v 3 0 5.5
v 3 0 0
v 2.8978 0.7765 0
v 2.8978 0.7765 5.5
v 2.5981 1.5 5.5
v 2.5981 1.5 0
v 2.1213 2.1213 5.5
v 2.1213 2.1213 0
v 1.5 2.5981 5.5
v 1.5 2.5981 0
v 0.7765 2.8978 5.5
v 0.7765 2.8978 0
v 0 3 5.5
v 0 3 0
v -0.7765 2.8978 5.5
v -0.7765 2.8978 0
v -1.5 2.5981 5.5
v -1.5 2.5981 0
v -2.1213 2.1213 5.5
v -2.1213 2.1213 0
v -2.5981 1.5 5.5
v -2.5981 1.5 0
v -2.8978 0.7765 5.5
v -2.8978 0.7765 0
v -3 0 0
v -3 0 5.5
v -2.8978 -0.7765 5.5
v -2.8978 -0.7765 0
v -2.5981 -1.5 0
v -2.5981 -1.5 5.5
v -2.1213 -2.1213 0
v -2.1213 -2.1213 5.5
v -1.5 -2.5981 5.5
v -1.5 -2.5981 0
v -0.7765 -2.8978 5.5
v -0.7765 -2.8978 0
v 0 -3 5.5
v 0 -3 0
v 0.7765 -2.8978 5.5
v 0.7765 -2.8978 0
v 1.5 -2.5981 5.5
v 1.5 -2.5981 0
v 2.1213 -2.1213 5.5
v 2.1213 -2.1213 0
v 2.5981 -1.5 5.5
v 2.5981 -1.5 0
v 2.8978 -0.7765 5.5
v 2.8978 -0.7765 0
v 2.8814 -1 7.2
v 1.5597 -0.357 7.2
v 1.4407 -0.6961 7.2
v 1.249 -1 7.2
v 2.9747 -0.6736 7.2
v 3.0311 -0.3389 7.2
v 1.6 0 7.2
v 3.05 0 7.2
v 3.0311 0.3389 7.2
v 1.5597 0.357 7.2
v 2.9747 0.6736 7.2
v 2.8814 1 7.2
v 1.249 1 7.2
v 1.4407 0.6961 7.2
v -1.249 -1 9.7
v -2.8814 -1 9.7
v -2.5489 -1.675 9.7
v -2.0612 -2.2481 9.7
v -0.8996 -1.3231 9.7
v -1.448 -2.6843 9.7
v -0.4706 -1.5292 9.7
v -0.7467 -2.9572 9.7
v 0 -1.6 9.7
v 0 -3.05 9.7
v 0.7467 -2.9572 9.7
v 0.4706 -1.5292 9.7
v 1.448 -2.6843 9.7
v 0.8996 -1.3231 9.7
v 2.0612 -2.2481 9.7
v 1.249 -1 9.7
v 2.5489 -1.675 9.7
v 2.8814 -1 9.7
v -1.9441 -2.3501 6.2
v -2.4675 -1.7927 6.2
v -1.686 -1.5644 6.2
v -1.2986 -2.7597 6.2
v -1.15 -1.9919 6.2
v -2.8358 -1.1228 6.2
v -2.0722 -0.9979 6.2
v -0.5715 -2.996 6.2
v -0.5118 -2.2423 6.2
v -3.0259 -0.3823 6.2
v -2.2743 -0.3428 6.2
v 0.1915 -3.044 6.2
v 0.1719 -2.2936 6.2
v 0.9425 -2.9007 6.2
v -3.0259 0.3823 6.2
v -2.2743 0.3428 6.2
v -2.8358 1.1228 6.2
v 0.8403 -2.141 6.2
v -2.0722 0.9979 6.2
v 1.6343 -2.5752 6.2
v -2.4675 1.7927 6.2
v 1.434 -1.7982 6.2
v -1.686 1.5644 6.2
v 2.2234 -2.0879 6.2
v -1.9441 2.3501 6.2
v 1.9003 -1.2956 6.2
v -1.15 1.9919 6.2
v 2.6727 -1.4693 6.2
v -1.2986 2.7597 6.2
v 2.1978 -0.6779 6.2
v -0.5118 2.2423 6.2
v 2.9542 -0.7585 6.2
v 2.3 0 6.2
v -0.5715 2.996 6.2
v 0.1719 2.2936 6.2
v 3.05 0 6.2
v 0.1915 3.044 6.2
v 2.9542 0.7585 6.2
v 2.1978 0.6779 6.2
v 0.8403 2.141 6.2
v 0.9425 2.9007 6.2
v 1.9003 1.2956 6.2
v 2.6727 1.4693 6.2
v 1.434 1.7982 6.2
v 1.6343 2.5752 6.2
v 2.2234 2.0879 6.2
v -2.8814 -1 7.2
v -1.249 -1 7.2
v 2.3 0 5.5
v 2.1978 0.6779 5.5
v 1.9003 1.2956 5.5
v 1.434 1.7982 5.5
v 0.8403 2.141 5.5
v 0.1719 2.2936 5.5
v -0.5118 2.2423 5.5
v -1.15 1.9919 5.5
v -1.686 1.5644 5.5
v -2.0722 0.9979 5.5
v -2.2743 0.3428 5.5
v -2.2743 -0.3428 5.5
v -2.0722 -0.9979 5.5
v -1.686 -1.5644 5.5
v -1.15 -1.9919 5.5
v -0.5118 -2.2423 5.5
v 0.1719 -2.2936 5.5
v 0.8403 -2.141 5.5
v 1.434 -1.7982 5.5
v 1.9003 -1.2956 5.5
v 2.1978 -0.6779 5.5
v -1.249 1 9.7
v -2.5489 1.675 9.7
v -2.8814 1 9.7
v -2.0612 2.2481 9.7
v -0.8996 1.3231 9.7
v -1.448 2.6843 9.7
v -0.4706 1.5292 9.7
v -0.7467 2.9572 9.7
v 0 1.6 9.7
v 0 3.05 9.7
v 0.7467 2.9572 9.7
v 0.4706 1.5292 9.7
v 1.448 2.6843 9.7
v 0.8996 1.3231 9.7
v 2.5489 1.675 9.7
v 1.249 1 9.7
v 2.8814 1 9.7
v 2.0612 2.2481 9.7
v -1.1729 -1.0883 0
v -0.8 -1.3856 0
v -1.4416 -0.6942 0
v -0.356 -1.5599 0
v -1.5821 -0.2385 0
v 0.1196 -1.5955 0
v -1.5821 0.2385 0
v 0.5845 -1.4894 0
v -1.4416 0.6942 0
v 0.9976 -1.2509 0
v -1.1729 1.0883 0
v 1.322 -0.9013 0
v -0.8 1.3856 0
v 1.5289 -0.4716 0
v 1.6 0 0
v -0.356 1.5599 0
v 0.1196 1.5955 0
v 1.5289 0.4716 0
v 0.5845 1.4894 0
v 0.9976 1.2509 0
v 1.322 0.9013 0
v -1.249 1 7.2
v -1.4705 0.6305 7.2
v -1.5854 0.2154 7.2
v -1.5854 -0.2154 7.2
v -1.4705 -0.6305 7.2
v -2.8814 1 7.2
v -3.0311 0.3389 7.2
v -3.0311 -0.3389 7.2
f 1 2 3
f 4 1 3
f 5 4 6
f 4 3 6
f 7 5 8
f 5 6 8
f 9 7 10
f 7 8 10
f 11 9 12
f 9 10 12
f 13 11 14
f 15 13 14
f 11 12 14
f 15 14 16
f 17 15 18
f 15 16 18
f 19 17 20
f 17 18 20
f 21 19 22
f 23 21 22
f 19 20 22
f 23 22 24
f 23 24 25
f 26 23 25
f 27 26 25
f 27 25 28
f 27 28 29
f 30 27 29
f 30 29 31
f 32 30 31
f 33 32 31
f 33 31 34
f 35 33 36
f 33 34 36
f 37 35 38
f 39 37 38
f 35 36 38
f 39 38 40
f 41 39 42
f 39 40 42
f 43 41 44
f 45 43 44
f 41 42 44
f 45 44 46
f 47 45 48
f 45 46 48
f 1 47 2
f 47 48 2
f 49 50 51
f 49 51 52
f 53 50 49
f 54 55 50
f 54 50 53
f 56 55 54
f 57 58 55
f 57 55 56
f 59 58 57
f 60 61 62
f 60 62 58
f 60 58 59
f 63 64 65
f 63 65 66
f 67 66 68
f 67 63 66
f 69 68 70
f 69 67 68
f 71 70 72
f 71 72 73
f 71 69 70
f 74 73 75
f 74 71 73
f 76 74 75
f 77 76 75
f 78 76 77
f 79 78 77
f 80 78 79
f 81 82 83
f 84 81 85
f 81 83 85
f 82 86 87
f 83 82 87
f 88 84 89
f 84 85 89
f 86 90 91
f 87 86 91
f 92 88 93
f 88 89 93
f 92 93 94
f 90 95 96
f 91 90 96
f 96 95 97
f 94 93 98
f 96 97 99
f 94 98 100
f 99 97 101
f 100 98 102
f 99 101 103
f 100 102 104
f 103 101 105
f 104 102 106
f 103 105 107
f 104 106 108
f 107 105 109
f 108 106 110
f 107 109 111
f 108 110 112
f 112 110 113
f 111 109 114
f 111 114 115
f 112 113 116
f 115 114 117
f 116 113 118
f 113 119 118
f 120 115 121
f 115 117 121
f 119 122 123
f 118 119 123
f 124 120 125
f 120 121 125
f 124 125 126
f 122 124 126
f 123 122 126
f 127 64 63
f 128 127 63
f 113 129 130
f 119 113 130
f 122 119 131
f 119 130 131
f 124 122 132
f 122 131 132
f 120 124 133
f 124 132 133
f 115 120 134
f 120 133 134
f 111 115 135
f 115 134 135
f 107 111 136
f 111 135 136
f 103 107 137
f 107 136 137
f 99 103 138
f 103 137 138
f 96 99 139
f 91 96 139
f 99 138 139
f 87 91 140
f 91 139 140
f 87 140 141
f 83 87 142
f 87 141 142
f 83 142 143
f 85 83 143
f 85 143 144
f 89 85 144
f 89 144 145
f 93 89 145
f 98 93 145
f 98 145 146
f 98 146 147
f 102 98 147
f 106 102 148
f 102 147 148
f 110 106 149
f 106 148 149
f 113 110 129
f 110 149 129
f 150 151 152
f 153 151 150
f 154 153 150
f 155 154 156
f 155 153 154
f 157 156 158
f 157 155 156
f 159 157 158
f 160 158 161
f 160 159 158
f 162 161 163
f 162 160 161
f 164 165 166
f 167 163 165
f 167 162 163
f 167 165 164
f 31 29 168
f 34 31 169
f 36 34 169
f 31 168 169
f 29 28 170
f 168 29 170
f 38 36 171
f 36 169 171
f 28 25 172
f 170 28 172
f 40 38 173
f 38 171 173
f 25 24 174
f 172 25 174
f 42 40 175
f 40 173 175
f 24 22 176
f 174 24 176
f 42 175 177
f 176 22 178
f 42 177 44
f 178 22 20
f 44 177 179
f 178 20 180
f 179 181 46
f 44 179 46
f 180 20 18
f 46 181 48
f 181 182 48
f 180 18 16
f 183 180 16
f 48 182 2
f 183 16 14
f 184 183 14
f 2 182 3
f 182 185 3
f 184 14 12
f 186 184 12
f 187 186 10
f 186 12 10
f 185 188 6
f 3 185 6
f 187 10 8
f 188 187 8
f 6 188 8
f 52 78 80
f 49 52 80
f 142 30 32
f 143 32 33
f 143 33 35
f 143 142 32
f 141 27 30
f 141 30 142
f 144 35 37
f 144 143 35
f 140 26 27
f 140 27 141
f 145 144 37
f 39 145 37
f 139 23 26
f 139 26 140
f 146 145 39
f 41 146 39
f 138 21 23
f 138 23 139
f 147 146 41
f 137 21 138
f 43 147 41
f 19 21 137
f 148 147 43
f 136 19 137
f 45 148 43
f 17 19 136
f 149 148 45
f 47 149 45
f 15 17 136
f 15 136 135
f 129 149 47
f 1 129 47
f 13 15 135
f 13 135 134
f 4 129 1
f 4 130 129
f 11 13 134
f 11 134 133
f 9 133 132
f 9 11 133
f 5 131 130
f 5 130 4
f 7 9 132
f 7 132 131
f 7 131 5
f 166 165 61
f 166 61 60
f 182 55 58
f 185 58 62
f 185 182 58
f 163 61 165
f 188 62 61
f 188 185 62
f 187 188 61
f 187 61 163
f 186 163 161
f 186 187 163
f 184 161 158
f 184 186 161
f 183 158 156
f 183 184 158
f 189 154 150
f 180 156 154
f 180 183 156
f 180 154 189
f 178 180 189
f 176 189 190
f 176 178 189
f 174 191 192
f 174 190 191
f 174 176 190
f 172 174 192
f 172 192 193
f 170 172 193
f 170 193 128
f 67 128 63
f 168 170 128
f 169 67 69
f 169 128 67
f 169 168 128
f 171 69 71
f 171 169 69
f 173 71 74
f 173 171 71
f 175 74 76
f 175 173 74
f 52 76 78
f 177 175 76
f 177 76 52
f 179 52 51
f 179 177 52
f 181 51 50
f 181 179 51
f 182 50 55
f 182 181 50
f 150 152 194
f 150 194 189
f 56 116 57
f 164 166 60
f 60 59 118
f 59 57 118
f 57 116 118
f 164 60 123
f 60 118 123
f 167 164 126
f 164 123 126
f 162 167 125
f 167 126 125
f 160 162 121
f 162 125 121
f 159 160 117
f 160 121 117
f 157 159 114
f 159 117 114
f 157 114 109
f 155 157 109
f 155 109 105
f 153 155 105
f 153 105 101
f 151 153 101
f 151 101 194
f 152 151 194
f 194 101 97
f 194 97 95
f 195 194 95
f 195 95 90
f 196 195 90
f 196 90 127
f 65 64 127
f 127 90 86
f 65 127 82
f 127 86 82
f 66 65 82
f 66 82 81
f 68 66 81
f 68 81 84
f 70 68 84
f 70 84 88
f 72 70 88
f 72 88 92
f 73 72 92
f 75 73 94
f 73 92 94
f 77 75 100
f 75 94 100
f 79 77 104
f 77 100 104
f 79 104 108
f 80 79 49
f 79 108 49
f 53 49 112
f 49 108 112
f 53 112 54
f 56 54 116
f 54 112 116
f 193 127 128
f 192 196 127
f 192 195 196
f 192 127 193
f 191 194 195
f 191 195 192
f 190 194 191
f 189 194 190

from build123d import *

# Parameters (mm, degrees)
SKETCH1_R           = 3
SKETCH1_R_2         = 1.6
BOSS_EXTRUDE1_DEPTH = 5.5
SKETCH2_R           = 2.3
SKETCH2_R_2         = 1.6
BOSS_EXTRUDE2_DEPTH = 0.7
SKETCH3_R           = 3.05
SKETCH3_R_2         = 2.3
SKETCH3_R_3         = 1.6
BOSS_EXTRUDE3_DEPTH = 3.5
SKETCH4_W           = 6.2
SKETCH4_H           = 2
CUT_EXTRUDE1_DEPTH  = 2.5


with BuildPart() as part:
    # Sketch1 → Boss-Extrude1 (new body)
    with BuildSketch(Plane.XY):
        Circle(SKETCH1_R)
        Circle(SKETCH1_R_2, mode=Mode.SUBTRACT)
    extrude(amount=BOSS_EXTRUDE1_DEPTH)

    # Sketch2 → Boss-Extrude2 (add)
    with BuildSketch(Plane.XY.offset(5.5)):
        Circle(SKETCH2_R)
        Circle(SKETCH2_R_2, mode=Mode.SUBTRACT)
    extrude(amount=BOSS_EXTRUDE2_DEPTH)

    # Sketch3 → Boss-Extrude3 (add)
    # profile 1 of 2: a face of its own
    with BuildSketch(Plane.XY.offset(6.2)):
        Circle(SKETCH3_R)
        Circle(SKETCH3_R_2, mode=Mode.SUBTRACT)
    # profile 2 of 2: a face of its own
    with BuildSketch(Plane.XY.offset(6.2)):
        Circle(SKETCH3_R_2)
        Circle(SKETCH3_R_3, mode=Mode.SUBTRACT)
    extrude(amount=BOSS_EXTRUDE3_DEPTH)

    # Sketch4 → Cut-Extrude1 (cut)
    with BuildSketch(Plane.XY.offset(9.7)):
        Rectangle(SKETCH4_W, SKETCH4_H)
    extrude(amount=-CUT_EXTRUDE1_DEPTH, mode=Mode.SUBTRACT)


solid = part.part
